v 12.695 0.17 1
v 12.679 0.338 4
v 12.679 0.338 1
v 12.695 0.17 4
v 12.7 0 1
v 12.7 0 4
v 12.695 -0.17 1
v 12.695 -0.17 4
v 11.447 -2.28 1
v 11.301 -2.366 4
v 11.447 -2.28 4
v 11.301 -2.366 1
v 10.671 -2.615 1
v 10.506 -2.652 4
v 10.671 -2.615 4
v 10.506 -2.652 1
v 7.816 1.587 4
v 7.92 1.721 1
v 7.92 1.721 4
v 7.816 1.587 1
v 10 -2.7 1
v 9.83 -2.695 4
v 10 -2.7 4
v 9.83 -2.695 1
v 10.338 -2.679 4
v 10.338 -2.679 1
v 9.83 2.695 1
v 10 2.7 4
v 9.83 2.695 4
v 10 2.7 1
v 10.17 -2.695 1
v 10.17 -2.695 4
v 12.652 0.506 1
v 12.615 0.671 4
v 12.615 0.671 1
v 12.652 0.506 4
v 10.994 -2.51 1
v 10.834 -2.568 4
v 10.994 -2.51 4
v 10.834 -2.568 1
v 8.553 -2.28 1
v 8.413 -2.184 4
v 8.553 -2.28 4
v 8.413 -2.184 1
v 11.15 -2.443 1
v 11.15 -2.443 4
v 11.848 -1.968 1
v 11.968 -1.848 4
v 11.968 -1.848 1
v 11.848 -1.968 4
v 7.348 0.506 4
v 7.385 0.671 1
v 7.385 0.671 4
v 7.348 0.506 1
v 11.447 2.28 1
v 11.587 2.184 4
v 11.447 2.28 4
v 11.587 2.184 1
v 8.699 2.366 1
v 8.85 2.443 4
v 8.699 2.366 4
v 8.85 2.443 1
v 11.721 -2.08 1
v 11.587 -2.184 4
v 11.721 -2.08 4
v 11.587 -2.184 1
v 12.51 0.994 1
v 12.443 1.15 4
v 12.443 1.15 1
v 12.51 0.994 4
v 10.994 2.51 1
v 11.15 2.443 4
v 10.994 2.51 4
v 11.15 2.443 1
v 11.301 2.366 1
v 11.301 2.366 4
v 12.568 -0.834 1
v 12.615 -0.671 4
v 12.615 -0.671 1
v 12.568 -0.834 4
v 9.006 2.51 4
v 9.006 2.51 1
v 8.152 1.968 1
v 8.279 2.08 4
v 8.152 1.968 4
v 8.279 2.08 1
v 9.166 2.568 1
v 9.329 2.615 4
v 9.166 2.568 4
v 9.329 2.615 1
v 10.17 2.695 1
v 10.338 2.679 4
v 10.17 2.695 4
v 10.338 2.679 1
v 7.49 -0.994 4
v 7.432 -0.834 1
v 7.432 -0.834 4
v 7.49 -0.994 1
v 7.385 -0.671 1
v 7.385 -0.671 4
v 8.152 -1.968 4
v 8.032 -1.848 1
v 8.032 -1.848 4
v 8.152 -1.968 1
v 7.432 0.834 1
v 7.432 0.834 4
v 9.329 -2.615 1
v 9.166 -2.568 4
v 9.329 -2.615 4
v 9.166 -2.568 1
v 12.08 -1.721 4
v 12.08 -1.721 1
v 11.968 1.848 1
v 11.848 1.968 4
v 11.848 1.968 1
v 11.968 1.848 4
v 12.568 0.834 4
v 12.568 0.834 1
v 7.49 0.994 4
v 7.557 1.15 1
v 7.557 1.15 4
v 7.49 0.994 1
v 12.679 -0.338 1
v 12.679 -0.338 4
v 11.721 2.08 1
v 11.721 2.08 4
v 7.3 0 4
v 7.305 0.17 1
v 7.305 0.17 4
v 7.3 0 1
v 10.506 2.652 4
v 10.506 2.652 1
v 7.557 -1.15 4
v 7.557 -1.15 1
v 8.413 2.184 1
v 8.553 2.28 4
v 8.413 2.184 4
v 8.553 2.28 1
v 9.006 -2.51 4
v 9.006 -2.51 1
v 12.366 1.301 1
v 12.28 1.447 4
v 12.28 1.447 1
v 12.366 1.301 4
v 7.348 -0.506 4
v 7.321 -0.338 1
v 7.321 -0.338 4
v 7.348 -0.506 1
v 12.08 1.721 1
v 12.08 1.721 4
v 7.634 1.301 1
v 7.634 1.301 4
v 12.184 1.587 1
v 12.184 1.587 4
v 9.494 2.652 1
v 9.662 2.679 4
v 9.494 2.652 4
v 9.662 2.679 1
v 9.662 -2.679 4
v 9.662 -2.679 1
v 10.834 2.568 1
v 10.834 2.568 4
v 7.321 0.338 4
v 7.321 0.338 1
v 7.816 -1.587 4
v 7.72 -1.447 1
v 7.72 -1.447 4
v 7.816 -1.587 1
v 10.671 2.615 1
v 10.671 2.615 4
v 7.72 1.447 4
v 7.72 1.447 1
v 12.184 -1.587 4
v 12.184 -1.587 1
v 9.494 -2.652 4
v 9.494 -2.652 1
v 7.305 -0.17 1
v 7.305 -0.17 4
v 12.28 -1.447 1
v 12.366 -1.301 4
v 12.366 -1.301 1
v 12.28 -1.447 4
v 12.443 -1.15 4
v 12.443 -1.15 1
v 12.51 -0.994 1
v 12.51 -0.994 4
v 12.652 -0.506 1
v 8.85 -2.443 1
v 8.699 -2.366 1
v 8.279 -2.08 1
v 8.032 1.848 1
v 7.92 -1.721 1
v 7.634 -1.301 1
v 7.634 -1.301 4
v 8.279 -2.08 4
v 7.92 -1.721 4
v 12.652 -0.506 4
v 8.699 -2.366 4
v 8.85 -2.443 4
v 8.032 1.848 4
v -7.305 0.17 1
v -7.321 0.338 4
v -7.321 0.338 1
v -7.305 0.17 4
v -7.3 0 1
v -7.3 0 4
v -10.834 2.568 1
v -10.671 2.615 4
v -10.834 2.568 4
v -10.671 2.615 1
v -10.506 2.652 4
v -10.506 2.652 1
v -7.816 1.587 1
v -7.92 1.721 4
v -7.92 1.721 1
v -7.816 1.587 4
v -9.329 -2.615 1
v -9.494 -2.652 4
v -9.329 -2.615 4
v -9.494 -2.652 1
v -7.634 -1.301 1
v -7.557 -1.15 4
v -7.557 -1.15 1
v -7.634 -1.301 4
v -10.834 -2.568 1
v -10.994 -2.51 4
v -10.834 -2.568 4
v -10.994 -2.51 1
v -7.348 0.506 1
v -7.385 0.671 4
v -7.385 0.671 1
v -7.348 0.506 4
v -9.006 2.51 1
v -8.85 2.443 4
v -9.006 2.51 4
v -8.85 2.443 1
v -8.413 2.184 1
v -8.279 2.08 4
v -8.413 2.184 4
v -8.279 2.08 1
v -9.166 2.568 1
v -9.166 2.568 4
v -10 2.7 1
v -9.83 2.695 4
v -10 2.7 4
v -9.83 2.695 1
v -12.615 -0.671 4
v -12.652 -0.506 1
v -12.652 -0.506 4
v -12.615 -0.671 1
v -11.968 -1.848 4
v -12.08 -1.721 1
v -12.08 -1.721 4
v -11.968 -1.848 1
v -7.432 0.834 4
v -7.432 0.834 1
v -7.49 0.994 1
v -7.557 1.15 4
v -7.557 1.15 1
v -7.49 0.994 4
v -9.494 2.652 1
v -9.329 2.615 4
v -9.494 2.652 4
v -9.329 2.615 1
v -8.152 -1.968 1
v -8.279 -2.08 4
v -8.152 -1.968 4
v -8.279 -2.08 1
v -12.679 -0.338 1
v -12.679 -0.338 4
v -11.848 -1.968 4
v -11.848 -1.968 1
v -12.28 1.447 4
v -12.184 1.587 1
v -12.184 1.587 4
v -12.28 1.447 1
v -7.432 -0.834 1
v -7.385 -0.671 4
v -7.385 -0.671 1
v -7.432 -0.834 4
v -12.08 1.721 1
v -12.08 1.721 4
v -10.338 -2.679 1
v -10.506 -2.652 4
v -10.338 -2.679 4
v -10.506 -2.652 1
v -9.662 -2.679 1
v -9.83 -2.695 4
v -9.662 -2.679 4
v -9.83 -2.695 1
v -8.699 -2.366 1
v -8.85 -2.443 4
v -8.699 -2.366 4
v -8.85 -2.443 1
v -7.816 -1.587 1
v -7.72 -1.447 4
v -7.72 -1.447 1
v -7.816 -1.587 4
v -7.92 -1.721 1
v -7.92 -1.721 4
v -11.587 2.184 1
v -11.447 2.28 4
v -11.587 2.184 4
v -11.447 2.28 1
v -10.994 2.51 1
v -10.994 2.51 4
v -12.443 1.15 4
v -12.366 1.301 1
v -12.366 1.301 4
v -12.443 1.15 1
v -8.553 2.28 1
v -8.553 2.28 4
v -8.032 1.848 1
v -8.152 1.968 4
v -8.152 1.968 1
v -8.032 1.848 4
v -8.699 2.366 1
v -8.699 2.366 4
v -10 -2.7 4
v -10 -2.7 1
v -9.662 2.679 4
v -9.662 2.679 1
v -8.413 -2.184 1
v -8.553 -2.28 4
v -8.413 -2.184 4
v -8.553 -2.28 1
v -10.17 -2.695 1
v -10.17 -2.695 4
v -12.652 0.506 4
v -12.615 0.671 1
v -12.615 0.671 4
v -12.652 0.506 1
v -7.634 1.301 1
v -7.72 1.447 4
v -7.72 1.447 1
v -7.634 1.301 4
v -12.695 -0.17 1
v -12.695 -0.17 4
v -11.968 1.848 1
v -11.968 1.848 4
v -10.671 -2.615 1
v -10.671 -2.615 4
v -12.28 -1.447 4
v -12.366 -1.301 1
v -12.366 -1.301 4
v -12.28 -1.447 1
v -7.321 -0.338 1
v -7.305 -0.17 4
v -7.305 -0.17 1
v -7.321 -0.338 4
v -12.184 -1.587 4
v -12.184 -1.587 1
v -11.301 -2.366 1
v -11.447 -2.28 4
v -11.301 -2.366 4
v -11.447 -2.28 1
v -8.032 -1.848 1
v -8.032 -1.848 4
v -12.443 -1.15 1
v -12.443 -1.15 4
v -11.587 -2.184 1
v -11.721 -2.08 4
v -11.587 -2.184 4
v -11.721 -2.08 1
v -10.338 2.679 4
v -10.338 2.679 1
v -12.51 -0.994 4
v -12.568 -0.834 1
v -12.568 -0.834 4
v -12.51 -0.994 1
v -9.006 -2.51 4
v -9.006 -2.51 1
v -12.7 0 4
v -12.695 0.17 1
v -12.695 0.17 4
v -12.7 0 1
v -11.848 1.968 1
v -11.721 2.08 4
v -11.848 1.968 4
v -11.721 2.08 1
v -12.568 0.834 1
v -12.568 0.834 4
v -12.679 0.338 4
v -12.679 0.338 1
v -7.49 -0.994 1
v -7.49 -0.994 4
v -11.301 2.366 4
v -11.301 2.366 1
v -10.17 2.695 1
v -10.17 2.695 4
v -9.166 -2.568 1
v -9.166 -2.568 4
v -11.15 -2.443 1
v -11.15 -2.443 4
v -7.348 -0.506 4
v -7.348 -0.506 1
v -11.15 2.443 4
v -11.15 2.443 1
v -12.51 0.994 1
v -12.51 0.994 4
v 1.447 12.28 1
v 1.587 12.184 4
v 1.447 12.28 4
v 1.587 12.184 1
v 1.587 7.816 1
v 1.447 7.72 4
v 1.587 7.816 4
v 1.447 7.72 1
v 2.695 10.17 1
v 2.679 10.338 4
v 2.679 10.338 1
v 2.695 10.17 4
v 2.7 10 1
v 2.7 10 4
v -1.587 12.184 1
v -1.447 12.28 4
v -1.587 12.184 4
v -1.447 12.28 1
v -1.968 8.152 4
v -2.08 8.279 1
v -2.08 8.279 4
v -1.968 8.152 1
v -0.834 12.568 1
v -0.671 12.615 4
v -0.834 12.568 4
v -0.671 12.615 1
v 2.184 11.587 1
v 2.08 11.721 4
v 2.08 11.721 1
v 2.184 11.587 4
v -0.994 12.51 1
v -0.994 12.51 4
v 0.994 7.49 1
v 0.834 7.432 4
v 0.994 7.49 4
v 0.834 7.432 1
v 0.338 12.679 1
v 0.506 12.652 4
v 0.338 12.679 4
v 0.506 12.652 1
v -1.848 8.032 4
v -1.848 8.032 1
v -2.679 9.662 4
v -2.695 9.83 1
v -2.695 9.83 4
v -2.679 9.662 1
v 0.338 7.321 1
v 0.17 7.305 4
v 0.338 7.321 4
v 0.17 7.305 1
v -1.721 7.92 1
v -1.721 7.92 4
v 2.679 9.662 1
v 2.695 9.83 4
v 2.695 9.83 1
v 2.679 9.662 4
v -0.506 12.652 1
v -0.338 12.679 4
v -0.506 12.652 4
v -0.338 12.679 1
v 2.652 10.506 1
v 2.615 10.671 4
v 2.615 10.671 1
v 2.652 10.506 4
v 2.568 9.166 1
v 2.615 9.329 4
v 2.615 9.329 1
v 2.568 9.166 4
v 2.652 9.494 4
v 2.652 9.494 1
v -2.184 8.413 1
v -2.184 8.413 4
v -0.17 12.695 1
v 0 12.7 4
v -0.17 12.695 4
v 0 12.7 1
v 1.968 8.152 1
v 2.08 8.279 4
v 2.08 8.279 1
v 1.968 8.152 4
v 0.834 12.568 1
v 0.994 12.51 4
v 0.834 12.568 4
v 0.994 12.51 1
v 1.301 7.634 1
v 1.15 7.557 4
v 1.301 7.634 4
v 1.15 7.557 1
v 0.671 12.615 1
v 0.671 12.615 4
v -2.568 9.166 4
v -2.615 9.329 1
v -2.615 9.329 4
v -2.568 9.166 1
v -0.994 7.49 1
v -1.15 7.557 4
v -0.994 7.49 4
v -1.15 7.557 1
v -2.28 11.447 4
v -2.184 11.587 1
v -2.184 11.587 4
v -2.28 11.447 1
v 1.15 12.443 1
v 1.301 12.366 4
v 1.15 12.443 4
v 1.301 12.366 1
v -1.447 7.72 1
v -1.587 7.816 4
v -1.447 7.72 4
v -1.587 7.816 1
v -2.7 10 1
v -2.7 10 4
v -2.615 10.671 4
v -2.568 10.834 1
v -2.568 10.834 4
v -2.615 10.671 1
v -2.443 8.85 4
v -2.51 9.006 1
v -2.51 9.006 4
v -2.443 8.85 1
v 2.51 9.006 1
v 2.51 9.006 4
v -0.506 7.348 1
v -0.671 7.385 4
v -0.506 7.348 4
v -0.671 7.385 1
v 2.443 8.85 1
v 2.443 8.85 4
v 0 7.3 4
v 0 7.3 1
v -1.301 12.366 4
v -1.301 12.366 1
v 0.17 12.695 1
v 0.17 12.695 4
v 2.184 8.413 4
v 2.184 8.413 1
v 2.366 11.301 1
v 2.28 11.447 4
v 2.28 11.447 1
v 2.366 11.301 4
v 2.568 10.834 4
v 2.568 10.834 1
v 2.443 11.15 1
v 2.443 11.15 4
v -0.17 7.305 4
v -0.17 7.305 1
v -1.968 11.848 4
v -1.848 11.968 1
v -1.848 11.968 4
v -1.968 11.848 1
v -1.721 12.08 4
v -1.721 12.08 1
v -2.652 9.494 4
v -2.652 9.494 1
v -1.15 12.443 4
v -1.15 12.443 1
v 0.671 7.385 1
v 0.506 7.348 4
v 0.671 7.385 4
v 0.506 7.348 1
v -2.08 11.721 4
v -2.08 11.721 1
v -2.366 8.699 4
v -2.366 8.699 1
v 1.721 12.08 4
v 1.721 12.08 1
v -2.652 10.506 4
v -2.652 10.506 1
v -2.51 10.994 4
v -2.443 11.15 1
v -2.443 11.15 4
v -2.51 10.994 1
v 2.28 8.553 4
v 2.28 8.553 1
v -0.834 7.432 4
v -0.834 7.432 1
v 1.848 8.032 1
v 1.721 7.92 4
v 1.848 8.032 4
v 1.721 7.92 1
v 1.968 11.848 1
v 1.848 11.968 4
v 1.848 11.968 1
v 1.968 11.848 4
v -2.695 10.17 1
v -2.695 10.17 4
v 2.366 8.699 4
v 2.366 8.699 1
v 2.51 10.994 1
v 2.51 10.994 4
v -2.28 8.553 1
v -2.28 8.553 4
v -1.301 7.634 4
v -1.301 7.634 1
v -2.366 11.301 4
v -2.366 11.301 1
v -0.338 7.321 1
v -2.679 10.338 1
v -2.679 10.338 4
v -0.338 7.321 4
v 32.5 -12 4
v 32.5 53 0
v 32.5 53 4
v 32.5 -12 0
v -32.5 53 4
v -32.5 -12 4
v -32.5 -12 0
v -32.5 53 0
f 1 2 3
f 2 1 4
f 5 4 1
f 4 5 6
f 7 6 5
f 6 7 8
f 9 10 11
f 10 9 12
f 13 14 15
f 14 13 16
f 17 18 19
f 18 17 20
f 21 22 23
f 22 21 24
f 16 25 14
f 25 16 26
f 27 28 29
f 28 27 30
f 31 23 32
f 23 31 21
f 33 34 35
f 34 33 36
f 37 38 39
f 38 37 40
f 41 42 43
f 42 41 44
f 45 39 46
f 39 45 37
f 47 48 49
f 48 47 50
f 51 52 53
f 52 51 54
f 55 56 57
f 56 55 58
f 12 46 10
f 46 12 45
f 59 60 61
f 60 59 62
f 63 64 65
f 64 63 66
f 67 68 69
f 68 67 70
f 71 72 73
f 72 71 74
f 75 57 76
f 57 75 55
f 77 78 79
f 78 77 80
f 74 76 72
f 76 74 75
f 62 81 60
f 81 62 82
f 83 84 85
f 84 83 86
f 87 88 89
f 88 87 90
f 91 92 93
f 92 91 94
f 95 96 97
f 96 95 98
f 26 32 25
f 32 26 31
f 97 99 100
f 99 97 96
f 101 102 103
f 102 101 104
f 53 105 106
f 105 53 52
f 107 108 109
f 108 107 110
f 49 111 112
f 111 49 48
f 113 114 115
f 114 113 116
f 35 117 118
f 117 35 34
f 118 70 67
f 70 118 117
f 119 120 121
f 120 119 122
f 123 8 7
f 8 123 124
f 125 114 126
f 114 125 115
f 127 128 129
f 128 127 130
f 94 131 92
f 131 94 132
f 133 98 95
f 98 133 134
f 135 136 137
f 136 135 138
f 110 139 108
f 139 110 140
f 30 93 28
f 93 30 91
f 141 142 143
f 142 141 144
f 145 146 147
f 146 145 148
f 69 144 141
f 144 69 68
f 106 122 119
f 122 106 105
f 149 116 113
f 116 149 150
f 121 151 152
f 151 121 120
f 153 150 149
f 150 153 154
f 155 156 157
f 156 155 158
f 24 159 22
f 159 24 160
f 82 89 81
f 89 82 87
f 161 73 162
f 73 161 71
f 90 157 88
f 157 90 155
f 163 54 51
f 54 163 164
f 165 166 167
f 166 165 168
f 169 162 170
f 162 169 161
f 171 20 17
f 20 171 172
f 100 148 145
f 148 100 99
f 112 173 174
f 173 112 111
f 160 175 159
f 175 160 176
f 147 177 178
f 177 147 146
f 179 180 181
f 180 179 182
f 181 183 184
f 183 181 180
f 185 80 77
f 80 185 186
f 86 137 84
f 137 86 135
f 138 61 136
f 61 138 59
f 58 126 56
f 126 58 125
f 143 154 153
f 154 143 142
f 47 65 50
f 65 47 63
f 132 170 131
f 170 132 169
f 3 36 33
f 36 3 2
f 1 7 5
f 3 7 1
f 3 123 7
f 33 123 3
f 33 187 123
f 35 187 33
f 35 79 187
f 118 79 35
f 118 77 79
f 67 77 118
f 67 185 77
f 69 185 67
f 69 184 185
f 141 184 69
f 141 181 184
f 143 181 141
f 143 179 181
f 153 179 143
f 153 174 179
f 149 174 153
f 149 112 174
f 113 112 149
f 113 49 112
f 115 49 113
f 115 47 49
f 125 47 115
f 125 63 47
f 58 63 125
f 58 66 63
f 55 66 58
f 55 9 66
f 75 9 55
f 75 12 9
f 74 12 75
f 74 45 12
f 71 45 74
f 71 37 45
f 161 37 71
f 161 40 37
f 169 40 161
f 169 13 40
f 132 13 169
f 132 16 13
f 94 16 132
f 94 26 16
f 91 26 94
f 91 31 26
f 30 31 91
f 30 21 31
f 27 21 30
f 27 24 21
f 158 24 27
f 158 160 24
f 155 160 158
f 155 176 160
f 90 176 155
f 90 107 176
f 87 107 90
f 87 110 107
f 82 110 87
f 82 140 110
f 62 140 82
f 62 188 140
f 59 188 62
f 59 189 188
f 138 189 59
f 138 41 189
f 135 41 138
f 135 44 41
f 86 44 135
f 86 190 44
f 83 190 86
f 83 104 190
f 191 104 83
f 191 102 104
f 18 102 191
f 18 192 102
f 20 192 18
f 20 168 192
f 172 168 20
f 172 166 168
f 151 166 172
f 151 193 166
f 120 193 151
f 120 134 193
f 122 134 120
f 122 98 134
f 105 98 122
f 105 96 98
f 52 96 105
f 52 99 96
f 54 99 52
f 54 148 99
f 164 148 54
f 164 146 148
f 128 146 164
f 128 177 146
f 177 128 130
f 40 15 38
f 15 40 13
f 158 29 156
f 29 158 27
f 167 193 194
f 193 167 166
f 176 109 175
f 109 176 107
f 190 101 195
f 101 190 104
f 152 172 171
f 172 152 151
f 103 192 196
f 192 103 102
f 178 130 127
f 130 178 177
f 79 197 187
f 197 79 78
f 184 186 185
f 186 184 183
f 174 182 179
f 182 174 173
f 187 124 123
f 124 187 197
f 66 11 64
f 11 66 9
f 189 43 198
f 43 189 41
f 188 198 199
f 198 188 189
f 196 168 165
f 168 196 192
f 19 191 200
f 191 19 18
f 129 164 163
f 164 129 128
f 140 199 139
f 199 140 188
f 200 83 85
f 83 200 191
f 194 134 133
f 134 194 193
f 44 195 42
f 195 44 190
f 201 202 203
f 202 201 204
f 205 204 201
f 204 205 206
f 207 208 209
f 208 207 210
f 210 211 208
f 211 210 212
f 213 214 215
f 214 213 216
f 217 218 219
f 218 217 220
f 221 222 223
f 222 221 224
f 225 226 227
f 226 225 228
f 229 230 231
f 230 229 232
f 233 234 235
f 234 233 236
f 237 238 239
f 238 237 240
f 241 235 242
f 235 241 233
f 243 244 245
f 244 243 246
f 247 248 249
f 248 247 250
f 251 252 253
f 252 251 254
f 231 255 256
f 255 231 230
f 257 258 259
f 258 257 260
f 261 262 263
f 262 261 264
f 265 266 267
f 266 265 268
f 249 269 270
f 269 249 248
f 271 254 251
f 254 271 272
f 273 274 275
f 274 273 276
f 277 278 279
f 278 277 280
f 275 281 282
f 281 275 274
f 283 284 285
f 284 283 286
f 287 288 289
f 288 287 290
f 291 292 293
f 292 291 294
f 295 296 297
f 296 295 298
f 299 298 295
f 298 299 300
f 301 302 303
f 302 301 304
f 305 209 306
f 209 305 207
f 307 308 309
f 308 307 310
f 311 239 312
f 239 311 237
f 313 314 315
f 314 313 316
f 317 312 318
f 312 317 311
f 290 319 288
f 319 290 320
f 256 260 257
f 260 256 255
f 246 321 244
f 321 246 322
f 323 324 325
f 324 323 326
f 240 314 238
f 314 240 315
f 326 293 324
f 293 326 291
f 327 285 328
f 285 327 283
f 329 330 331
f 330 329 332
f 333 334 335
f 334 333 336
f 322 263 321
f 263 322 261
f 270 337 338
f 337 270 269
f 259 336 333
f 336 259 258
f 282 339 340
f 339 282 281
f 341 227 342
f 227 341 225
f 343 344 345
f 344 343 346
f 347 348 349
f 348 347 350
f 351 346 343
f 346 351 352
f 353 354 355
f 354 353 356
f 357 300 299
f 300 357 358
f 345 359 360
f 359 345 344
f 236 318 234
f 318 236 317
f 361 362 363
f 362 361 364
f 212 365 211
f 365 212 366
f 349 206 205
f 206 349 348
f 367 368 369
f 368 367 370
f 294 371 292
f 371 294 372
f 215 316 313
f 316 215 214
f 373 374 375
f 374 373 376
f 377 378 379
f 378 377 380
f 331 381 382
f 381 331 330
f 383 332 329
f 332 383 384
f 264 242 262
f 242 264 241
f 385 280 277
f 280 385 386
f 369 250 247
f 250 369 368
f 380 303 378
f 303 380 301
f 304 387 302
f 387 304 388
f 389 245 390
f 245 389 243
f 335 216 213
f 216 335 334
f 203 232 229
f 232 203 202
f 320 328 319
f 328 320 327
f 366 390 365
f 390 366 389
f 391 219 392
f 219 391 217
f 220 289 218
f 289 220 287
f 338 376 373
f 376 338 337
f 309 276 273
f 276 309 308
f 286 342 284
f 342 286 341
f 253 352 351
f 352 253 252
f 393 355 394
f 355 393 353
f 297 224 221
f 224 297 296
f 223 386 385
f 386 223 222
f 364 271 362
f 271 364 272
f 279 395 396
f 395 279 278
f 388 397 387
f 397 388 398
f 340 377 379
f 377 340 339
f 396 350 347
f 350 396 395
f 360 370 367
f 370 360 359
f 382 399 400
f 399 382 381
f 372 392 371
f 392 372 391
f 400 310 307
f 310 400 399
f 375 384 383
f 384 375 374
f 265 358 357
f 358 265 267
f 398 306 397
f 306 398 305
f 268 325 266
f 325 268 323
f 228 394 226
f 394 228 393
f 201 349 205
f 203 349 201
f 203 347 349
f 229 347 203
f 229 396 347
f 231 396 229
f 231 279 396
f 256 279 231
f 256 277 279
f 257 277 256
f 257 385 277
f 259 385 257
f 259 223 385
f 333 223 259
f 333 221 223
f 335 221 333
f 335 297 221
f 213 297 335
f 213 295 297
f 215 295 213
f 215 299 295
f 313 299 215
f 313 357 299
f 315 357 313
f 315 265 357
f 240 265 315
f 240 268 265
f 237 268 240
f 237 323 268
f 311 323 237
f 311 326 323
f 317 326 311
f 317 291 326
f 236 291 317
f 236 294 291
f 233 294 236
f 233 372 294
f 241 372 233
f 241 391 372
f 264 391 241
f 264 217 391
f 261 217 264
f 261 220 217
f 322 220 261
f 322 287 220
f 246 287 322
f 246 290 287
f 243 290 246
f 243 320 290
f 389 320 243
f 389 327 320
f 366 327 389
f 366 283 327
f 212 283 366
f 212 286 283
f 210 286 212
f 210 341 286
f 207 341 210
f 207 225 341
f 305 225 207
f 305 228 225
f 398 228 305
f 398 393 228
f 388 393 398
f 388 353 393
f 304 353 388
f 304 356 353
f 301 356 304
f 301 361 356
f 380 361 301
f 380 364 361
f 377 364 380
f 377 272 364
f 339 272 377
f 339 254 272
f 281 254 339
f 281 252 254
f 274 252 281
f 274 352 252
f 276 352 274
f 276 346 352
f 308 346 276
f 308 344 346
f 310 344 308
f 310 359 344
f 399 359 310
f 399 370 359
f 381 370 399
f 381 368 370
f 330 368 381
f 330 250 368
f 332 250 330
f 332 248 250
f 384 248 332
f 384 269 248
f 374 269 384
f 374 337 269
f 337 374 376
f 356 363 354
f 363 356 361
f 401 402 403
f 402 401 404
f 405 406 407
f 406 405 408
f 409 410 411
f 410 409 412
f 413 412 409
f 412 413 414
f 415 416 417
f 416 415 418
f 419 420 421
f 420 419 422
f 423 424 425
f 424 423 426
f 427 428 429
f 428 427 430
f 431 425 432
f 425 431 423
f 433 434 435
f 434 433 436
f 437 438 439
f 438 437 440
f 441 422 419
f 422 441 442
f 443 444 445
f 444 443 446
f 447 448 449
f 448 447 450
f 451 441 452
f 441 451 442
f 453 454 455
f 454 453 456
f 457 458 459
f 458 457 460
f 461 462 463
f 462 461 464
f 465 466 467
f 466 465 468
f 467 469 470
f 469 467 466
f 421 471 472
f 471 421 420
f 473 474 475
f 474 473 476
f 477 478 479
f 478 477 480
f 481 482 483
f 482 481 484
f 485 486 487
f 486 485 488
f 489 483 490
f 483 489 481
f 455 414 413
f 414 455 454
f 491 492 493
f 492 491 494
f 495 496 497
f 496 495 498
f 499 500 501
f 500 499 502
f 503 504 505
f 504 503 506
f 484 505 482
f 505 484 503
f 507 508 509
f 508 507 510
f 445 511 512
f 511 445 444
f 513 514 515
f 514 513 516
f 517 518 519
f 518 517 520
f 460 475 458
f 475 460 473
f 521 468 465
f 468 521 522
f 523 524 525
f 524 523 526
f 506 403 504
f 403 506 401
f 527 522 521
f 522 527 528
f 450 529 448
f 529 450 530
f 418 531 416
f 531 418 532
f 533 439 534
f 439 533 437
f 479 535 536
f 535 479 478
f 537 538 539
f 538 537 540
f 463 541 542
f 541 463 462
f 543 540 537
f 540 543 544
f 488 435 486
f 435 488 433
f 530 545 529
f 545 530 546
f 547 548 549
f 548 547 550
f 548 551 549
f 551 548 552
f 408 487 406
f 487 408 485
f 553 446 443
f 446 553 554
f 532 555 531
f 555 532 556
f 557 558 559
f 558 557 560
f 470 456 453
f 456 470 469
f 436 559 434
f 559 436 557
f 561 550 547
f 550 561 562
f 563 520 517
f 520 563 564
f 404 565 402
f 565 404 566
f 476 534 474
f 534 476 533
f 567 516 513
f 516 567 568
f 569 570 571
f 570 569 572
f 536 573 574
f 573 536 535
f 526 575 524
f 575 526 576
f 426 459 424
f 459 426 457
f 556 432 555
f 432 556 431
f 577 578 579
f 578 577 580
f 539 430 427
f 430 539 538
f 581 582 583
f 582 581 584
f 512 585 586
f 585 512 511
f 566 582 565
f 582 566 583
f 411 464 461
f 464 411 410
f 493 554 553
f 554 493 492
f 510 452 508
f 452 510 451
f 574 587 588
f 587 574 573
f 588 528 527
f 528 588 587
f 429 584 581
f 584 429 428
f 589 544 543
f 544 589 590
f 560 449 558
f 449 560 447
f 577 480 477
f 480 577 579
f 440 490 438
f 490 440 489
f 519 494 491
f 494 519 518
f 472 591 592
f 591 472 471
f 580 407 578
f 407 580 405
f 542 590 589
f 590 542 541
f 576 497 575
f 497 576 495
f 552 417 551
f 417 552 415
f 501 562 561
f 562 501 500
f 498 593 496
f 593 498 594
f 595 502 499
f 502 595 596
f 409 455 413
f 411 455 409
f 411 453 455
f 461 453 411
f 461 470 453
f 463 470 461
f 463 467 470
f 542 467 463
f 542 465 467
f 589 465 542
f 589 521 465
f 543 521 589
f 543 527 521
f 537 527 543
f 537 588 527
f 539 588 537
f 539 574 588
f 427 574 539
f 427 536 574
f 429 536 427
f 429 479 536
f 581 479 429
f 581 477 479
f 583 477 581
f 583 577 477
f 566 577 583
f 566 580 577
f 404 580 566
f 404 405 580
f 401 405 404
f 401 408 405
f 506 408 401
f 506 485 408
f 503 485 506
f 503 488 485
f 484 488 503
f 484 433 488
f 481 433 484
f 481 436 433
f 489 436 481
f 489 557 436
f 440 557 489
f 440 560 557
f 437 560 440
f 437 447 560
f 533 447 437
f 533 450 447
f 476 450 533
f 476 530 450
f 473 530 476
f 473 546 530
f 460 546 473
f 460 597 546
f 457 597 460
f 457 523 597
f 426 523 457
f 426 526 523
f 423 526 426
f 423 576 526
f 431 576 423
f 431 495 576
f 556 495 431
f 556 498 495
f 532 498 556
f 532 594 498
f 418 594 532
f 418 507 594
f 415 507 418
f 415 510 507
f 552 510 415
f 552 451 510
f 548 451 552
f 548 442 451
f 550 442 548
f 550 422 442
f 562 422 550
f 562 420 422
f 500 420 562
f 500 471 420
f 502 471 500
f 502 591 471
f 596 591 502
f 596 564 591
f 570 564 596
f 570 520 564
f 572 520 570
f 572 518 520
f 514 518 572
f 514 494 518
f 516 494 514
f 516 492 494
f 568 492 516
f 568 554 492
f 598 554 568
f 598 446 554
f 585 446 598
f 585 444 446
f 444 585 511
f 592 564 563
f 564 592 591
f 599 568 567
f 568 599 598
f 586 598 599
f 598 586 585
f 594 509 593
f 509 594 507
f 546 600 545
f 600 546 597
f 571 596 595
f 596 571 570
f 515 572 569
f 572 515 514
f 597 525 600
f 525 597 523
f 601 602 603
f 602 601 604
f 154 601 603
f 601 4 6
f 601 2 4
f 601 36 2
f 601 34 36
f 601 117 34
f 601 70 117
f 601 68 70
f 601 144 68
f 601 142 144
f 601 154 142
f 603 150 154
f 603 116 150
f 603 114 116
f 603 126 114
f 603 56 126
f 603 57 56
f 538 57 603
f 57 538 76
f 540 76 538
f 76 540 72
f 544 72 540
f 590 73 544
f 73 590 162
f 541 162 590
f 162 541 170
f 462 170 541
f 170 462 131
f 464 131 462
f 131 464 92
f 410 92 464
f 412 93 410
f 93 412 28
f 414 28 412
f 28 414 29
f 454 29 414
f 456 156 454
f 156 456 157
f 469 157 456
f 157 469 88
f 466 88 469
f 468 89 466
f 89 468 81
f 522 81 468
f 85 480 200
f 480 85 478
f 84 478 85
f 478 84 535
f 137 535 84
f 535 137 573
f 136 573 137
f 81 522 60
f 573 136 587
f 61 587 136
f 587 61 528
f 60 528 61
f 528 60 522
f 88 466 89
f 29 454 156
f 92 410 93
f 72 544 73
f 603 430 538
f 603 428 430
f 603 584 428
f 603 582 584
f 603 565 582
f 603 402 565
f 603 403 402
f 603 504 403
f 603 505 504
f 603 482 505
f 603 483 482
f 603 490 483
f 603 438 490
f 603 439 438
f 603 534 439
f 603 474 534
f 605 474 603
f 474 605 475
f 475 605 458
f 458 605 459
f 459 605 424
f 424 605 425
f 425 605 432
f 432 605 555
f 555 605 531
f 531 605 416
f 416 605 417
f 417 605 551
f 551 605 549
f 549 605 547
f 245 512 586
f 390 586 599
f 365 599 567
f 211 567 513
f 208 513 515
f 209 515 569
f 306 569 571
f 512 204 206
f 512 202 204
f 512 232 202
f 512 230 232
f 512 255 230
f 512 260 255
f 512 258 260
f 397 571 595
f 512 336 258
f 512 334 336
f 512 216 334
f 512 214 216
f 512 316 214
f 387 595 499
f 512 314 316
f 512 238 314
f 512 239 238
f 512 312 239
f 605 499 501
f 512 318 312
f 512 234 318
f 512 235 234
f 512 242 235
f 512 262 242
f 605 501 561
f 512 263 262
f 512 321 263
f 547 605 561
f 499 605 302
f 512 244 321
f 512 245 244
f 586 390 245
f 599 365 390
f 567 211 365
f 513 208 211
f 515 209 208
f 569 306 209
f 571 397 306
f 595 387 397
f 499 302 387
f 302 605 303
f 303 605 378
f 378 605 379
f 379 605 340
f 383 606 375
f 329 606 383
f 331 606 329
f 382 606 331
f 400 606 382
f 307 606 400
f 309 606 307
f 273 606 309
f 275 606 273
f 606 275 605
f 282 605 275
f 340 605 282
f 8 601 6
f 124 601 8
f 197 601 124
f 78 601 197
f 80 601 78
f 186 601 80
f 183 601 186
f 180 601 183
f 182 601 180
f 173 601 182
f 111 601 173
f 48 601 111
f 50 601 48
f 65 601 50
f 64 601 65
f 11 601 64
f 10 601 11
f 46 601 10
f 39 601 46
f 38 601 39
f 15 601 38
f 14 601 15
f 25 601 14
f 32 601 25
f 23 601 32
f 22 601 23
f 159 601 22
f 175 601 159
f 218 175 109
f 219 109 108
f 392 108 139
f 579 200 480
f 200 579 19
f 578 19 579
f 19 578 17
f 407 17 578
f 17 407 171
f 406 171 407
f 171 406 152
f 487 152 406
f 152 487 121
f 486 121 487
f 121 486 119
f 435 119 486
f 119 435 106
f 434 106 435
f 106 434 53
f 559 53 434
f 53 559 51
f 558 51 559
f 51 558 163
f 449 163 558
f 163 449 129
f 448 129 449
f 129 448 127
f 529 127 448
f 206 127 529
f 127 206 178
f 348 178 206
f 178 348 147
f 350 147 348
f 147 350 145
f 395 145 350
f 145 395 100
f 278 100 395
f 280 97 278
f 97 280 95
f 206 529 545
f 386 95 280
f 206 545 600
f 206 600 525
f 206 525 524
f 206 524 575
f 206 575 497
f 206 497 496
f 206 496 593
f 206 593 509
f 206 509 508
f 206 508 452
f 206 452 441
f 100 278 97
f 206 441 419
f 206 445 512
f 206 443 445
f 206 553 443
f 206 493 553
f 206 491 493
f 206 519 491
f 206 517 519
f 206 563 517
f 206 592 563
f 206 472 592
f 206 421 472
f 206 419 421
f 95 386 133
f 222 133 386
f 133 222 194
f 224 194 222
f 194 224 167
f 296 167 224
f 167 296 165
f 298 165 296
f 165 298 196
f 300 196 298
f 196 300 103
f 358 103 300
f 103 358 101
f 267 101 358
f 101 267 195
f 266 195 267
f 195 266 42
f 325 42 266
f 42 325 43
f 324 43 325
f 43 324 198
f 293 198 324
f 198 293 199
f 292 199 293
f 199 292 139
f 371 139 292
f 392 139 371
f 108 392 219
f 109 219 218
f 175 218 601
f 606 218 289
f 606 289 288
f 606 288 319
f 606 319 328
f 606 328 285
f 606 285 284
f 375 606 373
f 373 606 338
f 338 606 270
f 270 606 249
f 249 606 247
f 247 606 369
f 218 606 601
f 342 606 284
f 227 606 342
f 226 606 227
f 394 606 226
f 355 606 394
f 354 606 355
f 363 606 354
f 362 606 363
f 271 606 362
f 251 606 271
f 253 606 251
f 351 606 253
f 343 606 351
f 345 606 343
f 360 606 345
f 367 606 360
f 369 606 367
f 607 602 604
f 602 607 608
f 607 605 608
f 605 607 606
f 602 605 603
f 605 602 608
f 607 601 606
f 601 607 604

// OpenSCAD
difference(){
	union(){ 

        difference(){
            union(){ 

                translate([-65/2, -12,0]){
                       cube([65,65,4], center=false);
                }                              

            }
            union() {
                translate([0+10,0,1]){
                    rotate([0,0,0]){
                        cylinder(h=500, r=2.7, $fn=100, center=false);
                    }   
                }
                translate([0-10,0,1]){
                    rotate([0,0,0]){
                        cylinder(h=500, r=2.7, $fn=100, center=false);
                    }   
                }
                translate([0,10,1]){
                    rotate([0,0,0]){
                        cylinder(h=500, r=2.7, $fn=100, center=false);
                    }   
                }
            }
         }

	}
	union() {
    }
}


 
